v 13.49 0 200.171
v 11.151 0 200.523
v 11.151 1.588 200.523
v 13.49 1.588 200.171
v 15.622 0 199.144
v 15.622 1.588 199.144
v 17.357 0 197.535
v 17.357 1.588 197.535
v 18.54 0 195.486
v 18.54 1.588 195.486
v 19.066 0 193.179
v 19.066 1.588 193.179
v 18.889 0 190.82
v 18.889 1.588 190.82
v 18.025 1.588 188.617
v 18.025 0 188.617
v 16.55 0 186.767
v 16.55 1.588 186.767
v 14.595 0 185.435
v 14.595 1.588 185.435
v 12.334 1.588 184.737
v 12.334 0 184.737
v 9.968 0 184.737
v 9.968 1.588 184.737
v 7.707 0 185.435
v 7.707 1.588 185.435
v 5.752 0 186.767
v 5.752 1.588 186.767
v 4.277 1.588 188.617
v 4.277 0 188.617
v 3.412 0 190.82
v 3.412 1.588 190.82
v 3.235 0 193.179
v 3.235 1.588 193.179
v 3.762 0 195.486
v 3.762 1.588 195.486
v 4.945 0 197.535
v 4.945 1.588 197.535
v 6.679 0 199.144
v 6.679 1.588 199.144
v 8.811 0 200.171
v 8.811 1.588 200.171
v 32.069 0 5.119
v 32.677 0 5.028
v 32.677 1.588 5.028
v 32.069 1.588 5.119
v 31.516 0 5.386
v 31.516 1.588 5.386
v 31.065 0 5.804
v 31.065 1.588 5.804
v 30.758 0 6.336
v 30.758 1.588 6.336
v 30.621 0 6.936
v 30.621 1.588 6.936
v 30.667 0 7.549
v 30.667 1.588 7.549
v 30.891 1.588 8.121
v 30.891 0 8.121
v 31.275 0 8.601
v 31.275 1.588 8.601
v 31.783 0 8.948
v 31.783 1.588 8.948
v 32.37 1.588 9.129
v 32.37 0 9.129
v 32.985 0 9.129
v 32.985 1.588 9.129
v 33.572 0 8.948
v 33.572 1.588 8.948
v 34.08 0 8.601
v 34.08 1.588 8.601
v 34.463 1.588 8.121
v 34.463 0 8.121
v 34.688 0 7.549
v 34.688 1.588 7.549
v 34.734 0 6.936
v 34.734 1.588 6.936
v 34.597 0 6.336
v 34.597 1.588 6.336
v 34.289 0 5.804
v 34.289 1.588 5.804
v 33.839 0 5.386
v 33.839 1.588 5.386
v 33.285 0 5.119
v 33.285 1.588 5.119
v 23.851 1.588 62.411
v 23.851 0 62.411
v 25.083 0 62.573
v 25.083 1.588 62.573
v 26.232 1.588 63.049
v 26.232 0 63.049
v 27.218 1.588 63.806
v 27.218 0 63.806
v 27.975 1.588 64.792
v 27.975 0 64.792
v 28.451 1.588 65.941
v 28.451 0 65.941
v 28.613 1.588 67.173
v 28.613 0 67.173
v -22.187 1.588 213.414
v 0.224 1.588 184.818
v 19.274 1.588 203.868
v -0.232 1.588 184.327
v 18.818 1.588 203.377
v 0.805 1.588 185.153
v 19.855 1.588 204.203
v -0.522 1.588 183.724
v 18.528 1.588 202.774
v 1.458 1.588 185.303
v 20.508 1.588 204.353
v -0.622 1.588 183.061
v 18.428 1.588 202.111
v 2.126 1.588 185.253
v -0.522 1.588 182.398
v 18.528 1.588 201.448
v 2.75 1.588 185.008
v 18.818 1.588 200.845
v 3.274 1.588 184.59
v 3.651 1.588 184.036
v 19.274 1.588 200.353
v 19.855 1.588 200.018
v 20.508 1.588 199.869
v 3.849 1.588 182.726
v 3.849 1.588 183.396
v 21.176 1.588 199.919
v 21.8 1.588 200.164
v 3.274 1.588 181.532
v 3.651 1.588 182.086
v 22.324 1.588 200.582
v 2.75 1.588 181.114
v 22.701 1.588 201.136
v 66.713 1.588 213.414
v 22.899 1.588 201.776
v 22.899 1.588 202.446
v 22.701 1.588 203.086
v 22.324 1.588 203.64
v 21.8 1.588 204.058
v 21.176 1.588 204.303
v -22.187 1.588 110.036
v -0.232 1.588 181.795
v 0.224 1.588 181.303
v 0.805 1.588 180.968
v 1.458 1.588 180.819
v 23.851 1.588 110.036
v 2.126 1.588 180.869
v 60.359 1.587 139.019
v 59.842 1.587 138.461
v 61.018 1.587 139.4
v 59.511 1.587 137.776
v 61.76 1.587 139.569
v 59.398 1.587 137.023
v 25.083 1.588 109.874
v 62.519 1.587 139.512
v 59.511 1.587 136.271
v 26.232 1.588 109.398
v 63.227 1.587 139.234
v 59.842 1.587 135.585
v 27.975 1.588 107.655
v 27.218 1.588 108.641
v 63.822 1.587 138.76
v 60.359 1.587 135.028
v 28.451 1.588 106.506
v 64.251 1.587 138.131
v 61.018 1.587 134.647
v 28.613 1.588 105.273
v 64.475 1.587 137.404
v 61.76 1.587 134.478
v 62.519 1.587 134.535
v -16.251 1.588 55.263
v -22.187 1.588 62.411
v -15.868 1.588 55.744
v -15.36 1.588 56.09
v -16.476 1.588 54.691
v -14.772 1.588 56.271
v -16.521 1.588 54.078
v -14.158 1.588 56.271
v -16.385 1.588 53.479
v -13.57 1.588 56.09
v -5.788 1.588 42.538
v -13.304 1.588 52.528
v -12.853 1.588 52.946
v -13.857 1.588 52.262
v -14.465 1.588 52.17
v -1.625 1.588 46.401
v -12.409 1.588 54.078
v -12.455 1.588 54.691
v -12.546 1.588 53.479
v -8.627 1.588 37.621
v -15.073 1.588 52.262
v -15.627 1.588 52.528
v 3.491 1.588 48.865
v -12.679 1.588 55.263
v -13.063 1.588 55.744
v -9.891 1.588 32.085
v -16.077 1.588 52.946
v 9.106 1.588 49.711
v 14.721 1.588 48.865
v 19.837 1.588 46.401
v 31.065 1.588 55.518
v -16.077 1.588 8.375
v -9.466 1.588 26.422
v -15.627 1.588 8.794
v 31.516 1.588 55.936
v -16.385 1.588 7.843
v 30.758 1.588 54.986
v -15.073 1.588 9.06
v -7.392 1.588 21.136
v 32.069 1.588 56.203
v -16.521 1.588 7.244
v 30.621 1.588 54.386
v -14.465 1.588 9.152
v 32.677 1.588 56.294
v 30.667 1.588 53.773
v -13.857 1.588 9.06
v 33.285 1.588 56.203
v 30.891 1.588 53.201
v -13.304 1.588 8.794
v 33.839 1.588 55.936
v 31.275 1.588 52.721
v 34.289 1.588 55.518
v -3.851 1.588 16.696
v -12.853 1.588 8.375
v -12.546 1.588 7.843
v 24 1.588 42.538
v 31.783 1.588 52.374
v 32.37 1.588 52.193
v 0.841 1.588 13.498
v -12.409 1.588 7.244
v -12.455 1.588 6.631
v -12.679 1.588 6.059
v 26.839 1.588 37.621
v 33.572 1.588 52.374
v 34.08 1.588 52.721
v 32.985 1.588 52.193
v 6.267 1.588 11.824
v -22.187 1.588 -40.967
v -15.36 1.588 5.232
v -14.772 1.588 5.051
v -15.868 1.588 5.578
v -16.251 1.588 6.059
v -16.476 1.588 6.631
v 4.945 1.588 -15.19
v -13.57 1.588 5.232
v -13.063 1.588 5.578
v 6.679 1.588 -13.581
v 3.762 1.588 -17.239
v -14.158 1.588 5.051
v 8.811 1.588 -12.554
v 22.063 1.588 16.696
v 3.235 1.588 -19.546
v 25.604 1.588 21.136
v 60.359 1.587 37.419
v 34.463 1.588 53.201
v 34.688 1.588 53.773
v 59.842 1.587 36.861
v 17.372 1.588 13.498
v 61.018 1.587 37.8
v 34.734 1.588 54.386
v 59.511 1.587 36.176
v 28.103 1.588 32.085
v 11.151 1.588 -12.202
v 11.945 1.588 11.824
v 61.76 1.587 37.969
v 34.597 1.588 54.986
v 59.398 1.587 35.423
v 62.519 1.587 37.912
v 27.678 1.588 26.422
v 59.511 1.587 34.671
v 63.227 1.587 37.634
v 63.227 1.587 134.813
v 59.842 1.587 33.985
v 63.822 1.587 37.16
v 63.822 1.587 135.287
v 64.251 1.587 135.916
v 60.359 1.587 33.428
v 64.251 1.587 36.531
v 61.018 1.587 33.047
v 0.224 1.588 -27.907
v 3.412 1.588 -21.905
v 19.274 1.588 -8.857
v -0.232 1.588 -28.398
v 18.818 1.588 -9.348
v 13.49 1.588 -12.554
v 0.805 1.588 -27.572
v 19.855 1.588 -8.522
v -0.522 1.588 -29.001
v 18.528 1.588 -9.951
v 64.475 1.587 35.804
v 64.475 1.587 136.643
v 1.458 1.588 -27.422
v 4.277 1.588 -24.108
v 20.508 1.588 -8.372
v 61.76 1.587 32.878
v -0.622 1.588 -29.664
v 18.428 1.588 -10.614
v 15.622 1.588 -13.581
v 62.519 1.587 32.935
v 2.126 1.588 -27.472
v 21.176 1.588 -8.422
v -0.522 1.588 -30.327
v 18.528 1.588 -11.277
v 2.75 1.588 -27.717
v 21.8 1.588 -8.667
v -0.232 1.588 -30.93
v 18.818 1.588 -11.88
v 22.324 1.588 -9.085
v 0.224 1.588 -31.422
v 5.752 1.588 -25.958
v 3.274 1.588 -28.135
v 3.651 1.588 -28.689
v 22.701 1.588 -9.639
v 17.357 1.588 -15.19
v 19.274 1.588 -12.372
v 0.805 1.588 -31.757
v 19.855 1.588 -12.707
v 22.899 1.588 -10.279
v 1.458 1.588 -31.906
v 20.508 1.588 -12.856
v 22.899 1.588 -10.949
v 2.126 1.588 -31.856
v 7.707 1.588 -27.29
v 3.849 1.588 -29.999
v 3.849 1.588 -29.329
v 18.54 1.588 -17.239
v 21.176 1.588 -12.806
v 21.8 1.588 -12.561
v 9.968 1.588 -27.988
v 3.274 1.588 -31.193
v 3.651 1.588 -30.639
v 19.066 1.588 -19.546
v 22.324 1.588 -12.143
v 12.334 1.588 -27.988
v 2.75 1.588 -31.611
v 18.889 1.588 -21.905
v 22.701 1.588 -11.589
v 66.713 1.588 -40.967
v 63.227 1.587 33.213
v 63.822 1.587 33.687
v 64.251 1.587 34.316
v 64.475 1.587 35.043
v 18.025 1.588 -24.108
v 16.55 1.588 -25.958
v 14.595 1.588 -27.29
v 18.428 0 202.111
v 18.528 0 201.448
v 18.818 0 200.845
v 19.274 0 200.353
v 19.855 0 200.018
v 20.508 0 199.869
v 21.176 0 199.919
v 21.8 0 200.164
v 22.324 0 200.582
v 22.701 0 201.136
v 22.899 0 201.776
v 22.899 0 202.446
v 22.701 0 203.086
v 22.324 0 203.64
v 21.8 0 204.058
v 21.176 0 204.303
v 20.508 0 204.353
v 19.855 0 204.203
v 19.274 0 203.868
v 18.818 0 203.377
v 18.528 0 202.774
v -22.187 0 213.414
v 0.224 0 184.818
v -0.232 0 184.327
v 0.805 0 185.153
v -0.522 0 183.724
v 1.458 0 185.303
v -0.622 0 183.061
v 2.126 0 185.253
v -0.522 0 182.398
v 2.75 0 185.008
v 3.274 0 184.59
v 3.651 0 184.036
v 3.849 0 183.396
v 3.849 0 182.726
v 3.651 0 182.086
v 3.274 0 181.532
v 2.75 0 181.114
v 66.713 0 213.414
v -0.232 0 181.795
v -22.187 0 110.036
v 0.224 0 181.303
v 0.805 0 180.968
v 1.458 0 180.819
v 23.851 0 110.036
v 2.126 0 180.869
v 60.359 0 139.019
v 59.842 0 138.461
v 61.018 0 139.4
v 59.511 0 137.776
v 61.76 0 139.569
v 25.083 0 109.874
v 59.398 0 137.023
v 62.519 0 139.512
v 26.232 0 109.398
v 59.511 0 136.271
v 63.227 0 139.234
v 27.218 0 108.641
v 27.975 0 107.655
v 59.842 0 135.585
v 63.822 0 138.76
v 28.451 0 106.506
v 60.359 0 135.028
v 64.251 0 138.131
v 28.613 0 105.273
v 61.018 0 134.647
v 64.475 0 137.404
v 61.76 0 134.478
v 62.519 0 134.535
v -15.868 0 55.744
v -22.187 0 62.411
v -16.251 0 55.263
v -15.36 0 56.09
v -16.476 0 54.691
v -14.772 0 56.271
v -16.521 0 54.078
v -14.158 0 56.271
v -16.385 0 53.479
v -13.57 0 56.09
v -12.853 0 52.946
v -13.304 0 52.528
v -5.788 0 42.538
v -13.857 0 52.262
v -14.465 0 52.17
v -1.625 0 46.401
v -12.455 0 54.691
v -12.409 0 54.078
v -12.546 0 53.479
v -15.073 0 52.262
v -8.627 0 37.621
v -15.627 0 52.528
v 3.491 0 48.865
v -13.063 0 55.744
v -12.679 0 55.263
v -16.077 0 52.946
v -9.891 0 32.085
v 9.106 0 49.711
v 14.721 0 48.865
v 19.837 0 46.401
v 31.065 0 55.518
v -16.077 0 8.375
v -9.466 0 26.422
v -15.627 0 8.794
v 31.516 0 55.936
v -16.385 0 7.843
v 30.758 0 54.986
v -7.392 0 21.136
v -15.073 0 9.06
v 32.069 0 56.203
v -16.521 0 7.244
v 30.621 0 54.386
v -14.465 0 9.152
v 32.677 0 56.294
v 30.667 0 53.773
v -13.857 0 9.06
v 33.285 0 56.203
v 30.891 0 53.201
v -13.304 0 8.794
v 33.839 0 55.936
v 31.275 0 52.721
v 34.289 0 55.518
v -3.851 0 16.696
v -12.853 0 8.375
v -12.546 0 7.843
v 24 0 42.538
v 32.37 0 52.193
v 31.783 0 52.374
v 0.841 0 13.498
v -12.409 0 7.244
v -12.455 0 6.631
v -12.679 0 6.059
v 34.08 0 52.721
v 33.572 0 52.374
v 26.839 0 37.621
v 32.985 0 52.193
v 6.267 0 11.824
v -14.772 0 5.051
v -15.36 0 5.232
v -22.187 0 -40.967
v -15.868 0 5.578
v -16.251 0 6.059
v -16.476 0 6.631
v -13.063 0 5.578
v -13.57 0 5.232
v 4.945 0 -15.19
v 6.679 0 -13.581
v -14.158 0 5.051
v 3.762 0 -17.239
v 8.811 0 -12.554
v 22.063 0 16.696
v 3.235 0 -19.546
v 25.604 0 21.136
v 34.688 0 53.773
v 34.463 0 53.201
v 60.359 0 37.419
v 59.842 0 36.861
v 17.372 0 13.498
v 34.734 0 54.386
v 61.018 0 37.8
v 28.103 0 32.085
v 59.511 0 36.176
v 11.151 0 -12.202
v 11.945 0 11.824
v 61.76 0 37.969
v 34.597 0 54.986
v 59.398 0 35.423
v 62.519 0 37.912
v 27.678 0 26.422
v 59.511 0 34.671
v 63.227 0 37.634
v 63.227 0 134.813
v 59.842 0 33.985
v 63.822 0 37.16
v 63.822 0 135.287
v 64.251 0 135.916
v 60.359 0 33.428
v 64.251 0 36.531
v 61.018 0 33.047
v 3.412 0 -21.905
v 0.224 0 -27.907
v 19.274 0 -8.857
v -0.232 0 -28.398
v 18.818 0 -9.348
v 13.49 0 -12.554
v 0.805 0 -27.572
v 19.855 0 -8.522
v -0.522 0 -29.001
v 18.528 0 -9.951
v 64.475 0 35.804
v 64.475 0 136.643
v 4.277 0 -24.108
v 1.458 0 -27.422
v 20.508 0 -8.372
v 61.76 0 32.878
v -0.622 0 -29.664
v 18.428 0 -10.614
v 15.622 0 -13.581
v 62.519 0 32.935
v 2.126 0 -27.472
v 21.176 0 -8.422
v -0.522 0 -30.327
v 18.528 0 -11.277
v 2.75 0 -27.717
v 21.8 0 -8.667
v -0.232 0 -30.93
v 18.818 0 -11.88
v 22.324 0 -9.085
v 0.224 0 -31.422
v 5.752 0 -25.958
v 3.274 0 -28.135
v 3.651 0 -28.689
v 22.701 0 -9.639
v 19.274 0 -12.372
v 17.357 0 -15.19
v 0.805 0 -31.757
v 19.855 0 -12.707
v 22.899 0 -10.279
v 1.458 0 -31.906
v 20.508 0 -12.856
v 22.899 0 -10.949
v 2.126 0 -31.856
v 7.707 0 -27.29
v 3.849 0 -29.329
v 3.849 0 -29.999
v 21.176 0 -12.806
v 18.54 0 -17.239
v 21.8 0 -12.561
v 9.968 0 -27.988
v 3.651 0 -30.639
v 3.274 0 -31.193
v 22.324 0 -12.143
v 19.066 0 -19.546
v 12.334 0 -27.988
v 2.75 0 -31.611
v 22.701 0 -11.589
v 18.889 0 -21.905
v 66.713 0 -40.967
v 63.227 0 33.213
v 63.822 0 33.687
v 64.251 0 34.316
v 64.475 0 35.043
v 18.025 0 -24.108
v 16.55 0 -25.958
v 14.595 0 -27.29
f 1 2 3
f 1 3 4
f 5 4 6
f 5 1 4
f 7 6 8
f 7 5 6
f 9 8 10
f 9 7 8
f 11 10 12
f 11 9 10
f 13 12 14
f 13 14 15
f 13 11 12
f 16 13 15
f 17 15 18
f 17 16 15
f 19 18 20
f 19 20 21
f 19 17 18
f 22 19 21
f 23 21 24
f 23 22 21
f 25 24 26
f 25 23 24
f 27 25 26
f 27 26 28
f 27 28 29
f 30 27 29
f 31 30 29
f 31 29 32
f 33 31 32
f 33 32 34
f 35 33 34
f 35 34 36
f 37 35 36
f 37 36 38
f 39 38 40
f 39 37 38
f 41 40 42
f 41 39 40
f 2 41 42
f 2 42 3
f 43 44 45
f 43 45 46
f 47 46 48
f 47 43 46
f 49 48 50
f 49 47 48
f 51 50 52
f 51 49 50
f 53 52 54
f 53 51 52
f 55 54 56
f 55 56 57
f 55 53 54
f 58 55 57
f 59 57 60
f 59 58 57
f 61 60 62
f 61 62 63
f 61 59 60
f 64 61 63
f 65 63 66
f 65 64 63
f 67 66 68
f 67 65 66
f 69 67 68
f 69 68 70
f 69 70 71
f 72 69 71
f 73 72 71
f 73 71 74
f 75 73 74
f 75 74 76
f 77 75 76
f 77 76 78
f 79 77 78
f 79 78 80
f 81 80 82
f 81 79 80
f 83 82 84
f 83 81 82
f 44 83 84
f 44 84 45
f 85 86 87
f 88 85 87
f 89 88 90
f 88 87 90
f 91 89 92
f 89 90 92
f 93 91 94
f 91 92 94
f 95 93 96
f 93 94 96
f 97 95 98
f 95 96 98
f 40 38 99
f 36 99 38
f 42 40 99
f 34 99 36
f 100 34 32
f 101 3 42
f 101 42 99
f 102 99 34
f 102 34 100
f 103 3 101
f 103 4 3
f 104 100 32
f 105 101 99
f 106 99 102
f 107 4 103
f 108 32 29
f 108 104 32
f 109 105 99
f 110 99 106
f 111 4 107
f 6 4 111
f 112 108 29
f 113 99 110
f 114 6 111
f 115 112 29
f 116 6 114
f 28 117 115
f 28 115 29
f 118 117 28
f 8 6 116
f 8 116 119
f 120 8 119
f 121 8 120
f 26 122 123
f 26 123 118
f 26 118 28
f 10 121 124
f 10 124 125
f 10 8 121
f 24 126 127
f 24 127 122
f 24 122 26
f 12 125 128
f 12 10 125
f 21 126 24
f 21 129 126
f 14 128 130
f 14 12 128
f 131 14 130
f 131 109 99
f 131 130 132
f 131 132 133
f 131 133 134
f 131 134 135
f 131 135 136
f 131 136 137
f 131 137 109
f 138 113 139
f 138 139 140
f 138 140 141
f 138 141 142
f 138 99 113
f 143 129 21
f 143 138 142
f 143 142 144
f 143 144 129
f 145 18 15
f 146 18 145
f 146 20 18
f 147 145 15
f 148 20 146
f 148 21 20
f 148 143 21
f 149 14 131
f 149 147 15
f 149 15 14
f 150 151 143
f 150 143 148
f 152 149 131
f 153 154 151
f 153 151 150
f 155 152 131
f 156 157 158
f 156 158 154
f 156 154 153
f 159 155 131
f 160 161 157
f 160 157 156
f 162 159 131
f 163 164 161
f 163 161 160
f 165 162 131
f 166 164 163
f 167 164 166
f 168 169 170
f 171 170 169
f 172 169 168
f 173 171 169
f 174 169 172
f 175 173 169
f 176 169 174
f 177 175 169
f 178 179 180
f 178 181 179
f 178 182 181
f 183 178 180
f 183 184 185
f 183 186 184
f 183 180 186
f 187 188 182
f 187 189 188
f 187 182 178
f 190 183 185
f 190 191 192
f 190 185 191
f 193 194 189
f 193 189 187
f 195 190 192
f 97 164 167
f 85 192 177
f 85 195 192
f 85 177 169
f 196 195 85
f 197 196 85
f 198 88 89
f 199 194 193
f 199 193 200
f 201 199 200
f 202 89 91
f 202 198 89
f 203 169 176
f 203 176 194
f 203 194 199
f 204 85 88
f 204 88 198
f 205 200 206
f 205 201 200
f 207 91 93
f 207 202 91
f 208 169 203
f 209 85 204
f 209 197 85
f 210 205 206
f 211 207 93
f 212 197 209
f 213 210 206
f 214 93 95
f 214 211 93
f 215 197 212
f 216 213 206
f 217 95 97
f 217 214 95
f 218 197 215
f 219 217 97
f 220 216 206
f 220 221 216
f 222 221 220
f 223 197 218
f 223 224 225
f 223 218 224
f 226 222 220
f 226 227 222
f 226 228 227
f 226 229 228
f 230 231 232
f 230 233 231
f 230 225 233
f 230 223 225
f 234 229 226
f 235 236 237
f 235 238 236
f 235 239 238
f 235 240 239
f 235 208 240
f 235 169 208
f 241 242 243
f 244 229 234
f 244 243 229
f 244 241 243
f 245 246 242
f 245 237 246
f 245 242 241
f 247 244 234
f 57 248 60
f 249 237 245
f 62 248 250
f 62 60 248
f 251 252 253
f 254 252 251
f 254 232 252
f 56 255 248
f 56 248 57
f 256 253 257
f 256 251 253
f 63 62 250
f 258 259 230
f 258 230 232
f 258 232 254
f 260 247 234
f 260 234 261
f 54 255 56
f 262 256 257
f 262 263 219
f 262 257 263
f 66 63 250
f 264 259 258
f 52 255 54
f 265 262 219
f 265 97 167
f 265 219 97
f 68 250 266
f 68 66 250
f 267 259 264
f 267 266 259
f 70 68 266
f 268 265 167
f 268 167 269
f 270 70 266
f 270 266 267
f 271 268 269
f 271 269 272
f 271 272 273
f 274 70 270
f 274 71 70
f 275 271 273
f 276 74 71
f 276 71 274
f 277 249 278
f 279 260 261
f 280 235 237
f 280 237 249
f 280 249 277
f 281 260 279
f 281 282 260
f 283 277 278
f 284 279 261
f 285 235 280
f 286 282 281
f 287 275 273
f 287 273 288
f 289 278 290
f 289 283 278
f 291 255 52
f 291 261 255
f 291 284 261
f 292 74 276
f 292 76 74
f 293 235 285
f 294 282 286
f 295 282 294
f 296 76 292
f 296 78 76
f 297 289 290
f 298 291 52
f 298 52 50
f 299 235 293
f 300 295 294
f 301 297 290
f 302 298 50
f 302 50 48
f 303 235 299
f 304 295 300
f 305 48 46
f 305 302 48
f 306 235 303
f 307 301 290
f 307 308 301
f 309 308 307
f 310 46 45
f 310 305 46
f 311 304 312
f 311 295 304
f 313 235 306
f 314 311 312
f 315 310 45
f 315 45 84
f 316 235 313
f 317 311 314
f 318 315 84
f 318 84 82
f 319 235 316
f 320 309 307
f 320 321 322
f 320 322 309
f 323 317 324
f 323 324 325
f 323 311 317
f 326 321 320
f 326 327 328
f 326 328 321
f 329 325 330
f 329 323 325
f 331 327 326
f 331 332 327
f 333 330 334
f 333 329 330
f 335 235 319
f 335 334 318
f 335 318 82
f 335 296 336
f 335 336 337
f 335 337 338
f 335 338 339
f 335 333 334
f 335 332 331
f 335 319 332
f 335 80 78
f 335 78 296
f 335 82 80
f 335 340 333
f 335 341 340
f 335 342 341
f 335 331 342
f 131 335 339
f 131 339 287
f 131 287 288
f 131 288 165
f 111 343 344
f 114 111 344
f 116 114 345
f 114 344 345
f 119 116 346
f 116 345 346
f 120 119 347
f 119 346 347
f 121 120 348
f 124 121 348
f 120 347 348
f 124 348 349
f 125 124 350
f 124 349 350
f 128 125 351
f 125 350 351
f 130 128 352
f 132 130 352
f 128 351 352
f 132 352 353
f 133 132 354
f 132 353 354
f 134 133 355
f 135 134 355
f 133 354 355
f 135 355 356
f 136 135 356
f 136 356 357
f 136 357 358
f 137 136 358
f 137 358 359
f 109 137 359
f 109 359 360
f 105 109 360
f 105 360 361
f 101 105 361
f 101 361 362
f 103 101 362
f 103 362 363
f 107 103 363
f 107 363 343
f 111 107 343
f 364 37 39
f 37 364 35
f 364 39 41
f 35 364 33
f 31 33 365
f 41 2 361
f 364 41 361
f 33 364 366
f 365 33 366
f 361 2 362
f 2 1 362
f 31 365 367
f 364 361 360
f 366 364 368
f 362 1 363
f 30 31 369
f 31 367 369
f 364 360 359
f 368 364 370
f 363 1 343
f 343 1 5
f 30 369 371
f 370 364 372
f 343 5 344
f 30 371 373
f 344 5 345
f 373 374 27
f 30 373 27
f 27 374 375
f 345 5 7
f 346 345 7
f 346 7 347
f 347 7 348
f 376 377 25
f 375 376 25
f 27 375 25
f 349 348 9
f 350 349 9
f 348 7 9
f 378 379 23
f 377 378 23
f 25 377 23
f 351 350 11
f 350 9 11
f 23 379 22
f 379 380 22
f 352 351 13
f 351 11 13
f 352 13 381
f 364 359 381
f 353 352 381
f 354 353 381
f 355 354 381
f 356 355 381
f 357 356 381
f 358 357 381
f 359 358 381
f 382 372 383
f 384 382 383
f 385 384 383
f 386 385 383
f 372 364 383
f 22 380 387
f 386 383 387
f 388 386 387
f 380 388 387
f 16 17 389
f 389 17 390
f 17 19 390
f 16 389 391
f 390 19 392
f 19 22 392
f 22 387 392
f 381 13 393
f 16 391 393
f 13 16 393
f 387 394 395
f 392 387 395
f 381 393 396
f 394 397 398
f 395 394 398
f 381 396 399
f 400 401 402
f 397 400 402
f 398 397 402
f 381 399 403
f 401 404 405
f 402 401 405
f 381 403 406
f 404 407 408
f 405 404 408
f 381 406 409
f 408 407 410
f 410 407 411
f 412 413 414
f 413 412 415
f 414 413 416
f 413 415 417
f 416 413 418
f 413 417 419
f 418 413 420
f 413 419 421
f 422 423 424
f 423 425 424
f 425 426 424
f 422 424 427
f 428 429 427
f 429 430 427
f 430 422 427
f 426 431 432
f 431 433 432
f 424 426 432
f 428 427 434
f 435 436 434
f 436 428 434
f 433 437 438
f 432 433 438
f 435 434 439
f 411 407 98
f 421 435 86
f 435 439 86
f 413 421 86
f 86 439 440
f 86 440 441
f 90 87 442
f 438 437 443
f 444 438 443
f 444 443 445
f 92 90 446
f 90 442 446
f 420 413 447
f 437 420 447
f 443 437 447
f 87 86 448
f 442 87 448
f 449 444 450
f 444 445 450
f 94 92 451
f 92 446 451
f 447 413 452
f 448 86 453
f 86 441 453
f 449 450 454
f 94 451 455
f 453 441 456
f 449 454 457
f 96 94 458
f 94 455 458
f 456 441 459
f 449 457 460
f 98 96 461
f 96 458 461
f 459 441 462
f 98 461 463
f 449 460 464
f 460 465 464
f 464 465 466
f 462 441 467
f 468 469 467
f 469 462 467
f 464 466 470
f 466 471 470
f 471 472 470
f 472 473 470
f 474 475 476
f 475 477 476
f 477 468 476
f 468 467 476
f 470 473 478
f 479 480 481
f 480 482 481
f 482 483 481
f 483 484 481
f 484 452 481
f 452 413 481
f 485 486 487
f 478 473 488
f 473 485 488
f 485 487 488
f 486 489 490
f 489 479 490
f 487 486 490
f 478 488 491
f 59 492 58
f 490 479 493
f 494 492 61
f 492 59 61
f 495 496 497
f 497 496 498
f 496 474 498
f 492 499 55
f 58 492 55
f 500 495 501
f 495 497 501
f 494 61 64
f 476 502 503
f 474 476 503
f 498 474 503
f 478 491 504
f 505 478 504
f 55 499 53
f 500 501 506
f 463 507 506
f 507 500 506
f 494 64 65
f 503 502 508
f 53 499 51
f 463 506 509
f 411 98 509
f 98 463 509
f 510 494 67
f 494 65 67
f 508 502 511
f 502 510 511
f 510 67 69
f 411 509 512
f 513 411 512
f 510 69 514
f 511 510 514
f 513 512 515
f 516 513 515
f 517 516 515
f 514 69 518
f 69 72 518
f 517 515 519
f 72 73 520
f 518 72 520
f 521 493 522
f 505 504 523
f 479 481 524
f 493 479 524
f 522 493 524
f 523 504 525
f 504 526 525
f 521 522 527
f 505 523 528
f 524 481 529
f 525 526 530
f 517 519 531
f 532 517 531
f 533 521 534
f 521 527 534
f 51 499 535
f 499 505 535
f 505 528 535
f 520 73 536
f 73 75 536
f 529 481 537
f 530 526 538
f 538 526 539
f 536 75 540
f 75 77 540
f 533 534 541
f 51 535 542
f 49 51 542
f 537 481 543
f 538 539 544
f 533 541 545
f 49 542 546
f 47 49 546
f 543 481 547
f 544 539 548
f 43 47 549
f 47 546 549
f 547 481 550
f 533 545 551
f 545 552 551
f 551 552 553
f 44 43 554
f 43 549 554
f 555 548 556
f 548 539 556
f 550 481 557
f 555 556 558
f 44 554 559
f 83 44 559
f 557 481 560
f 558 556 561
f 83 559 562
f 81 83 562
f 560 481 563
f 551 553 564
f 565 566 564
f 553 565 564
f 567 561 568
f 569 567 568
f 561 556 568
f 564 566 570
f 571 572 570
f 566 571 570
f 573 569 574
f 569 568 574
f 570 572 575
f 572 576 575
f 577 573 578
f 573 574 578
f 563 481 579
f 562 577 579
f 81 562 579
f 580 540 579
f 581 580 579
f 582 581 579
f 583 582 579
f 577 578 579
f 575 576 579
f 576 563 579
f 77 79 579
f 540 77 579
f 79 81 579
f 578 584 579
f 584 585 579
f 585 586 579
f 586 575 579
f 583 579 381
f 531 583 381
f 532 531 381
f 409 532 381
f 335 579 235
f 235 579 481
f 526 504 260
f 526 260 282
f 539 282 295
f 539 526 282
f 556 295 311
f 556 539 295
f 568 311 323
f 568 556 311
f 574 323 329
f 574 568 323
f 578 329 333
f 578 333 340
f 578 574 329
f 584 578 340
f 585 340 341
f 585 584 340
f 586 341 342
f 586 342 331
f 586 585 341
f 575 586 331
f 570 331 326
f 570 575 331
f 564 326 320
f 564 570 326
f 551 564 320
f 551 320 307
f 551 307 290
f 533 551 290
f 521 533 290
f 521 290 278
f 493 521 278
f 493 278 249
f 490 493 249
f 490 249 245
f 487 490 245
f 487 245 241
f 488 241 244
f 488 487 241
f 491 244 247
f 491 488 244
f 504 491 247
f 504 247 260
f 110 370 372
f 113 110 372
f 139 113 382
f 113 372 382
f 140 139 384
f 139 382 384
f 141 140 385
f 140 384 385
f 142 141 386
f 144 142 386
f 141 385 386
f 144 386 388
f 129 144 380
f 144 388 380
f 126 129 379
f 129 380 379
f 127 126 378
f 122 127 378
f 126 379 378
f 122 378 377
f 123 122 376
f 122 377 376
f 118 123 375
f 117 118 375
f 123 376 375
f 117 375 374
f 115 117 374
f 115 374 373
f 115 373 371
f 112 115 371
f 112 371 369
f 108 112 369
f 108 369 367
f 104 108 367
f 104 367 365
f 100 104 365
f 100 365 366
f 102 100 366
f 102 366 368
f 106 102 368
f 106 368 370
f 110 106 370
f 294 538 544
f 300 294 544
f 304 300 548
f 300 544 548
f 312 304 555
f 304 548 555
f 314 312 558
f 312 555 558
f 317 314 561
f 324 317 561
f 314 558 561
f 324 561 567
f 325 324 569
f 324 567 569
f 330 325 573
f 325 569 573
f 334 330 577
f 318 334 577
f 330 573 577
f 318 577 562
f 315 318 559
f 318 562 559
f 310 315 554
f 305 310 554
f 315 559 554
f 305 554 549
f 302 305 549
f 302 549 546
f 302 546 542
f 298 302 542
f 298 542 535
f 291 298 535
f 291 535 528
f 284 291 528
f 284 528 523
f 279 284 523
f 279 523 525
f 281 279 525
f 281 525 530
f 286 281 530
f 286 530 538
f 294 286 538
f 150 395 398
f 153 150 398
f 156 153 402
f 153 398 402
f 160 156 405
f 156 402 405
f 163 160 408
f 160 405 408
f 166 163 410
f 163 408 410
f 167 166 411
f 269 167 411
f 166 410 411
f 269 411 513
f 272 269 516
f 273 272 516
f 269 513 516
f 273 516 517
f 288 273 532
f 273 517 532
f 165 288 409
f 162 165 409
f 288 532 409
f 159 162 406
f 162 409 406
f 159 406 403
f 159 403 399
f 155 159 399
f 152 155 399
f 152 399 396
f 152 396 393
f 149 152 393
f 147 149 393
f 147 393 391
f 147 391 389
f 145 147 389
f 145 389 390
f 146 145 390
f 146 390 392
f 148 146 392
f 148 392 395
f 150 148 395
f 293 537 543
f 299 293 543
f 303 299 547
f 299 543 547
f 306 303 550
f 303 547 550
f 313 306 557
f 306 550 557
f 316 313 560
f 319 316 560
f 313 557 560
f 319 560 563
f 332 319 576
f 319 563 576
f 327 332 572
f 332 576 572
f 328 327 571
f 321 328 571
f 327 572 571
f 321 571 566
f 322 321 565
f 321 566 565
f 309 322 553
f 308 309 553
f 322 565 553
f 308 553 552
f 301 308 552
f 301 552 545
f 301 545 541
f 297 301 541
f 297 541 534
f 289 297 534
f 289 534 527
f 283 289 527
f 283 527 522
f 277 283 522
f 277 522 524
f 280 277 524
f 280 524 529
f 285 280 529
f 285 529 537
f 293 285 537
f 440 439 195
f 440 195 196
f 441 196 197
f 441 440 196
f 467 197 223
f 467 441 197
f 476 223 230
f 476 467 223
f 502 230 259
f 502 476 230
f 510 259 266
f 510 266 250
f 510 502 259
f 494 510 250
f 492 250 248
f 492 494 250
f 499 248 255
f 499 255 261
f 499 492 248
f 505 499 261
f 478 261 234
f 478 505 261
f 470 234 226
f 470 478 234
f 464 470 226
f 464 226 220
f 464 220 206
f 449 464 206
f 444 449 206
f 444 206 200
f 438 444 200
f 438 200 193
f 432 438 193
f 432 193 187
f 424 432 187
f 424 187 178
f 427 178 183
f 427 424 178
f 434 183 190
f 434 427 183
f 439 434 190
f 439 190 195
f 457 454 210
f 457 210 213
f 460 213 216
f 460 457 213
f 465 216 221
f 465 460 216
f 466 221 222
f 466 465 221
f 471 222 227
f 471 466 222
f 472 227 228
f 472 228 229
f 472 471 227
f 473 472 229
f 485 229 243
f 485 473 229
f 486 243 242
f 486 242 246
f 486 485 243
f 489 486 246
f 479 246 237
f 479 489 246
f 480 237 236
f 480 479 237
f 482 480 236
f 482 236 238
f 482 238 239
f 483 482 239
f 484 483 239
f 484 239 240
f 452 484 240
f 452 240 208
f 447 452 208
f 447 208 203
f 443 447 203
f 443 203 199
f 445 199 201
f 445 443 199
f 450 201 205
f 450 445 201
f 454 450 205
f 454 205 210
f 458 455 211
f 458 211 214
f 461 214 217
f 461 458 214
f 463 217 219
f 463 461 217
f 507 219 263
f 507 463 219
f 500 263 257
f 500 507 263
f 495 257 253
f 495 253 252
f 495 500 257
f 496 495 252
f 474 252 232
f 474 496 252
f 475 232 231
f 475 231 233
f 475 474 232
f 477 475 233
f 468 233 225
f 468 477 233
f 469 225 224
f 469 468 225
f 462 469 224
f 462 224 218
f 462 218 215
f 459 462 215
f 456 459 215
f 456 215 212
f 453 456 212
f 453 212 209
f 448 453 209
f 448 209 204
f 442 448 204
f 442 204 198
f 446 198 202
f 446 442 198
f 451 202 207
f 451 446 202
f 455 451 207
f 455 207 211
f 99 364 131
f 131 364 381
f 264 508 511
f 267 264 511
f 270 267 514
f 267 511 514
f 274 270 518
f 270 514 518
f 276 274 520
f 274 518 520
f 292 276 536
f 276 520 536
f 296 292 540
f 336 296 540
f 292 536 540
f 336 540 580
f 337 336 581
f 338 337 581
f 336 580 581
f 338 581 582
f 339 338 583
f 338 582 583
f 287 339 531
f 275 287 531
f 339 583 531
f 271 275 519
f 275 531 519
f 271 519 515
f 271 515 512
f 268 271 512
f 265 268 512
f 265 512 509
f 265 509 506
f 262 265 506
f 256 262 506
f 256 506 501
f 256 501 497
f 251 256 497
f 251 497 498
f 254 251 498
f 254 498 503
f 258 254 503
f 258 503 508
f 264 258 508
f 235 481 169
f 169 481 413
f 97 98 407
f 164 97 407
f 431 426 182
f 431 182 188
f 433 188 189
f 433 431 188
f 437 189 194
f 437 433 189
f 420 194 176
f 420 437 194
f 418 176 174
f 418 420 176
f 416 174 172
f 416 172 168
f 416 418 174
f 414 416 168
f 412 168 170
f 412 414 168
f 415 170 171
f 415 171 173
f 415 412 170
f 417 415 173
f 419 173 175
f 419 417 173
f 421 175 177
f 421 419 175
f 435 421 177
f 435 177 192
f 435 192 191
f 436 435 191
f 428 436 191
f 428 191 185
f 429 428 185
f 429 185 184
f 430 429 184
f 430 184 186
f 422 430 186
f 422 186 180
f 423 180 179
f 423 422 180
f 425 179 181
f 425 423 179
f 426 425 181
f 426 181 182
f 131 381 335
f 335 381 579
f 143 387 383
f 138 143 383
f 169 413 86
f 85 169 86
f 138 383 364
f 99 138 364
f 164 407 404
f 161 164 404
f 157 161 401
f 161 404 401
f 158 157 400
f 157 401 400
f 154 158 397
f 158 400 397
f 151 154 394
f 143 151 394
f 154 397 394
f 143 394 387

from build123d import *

# Parameters (mm, degrees)
SKETCH1_R                 = 19.05
SKETCH1_R_2               = 7.9375
SKETCH1_R_3               = 2.062114731
BOSS_EXTRUDE1_DEPTH       = 1.5875
F_10_CLEARANCE_HOLE1_D    = 5.1054
F_8_CLEARANCE_HOLE1_D     = 4.4958
F_8_CLEARANCE_HOLE1_DEPTH = 6.35
F_8_CLEARANCE_HOLE1_TIP   = 1.350674586


with BuildPart() as part:
    # Sketch1 → Boss-Extrude1 (new body)
    with BuildSketch(Plane(origin=(0, 0, 0), x_dir=(1, 0, 0), z_dir=(0, 1, 0))):
        with BuildLine():
            Line((-22.186740071, -110.035971993), (-22.186740071, -213.413971993))
            Line((-22.186740071, -213.413971993), (66.713259929, -213.413971993))
            Line((66.713259929, -213.413971993), (66.713259929, 40.967028007))
            Line((66.713259929, 40.967028007), (-22.186740071, 40.967028007))
            Line((-22.186740071, 40.967028007), (-22.186740071, -62.410971993))
            Line((-22.186740071, -62.410971993), (23.850759929, -62.410971993))
            ThreePointArc((23.850759929, -62.410971993), (27.218355974, -63.805875948), (28.613259929, -67.173471993))
            Line((28.613259929, -67.173471993), (28.613259929, -105.273471993))
            ThreePointArc((28.613259929, -105.273471993), (27.218355974, -108.641068039), (23.850759929, -110.035971993))
            Line((23.850759929, -110.035971993), (-22.186740071, -110.035971993))
        make_face()
        with Locations(Location((9.106059929, -30.660971993, 0), (0, 0, 270))):
            Circle(SKETCH1_R, mode=Mode.SUBTRACT)
        with Locations(Location((11.150759929, 20.139028007, 0), (0, 0, 270))):
            Circle(SKETCH1_R_2, mode=Mode.SUBTRACT)
        with Locations(Location((11.150759929, -192.585971993, 0), (0, 0, 270))):
            Circle(SKETCH1_R_2, mode=Mode.SUBTRACT)
        with Locations(Location((-14.465140071, -7.089771993, 0), (0, 0, 270))):
            Circle(SKETCH1_R_3, mode=Mode.SUBTRACT)
        with Locations(Location((32.677259929, -7.089771993, 0), (0, 0, 90))):
            Circle(SKETCH1_R_3, mode=Mode.SUBTRACT)
        with Locations(Location((32.677259929, -54.232171993, 0), (0, 0, 270))):
            Circle(SKETCH1_R_3, mode=Mode.SUBTRACT)
        with Locations(Location((-14.465140071, -54.232171993, 0), (0, 0, 90))):
            Circle(SKETCH1_R_3, mode=Mode.SUBTRACT)
    extrude(amount=BOSS_EXTRUDE1_DEPTH)

    # #10 Clearance Hole1 (through all)
    with Locations(Plane(origin=(0, 1.5875, 0), x_dir=(1, 0, 0), z_dir=(0, 1, 0))):
        with Locations((61.950759929, -137.023471993), (61.950759929, -35.423471993)):
            Hole(F_10_CLEARANCE_HOLE1_D / 2)

    # #8 Clearance Hole1
    with Locations(Plane(origin=(0, 1.5875, 0), x_dir=(1, 0, 0), z_dir=(0, 1, 0))):
        with Locations((1.625759929, 29.664028007), (20.675759929, 10.614028007), (1.625759929, -183.060971993), (20.675759929, -202.110971993)):
            Hole(F_8_CLEARANCE_HOLE1_D / 2, depth=F_8_CLEARANCE_HOLE1_DEPTH)
            with Locations((0, 0, -(F_8_CLEARANCE_HOLE1_DEPTH + F_8_CLEARANCE_HOLE1_TIP / 2))):  # 118° drill point
                Cone(0, F_8_CLEARANCE_HOLE1_D / 2, F_8_CLEARANCE_HOLE1_TIP, mode=Mode.SUBTRACT)


solid = part.part
